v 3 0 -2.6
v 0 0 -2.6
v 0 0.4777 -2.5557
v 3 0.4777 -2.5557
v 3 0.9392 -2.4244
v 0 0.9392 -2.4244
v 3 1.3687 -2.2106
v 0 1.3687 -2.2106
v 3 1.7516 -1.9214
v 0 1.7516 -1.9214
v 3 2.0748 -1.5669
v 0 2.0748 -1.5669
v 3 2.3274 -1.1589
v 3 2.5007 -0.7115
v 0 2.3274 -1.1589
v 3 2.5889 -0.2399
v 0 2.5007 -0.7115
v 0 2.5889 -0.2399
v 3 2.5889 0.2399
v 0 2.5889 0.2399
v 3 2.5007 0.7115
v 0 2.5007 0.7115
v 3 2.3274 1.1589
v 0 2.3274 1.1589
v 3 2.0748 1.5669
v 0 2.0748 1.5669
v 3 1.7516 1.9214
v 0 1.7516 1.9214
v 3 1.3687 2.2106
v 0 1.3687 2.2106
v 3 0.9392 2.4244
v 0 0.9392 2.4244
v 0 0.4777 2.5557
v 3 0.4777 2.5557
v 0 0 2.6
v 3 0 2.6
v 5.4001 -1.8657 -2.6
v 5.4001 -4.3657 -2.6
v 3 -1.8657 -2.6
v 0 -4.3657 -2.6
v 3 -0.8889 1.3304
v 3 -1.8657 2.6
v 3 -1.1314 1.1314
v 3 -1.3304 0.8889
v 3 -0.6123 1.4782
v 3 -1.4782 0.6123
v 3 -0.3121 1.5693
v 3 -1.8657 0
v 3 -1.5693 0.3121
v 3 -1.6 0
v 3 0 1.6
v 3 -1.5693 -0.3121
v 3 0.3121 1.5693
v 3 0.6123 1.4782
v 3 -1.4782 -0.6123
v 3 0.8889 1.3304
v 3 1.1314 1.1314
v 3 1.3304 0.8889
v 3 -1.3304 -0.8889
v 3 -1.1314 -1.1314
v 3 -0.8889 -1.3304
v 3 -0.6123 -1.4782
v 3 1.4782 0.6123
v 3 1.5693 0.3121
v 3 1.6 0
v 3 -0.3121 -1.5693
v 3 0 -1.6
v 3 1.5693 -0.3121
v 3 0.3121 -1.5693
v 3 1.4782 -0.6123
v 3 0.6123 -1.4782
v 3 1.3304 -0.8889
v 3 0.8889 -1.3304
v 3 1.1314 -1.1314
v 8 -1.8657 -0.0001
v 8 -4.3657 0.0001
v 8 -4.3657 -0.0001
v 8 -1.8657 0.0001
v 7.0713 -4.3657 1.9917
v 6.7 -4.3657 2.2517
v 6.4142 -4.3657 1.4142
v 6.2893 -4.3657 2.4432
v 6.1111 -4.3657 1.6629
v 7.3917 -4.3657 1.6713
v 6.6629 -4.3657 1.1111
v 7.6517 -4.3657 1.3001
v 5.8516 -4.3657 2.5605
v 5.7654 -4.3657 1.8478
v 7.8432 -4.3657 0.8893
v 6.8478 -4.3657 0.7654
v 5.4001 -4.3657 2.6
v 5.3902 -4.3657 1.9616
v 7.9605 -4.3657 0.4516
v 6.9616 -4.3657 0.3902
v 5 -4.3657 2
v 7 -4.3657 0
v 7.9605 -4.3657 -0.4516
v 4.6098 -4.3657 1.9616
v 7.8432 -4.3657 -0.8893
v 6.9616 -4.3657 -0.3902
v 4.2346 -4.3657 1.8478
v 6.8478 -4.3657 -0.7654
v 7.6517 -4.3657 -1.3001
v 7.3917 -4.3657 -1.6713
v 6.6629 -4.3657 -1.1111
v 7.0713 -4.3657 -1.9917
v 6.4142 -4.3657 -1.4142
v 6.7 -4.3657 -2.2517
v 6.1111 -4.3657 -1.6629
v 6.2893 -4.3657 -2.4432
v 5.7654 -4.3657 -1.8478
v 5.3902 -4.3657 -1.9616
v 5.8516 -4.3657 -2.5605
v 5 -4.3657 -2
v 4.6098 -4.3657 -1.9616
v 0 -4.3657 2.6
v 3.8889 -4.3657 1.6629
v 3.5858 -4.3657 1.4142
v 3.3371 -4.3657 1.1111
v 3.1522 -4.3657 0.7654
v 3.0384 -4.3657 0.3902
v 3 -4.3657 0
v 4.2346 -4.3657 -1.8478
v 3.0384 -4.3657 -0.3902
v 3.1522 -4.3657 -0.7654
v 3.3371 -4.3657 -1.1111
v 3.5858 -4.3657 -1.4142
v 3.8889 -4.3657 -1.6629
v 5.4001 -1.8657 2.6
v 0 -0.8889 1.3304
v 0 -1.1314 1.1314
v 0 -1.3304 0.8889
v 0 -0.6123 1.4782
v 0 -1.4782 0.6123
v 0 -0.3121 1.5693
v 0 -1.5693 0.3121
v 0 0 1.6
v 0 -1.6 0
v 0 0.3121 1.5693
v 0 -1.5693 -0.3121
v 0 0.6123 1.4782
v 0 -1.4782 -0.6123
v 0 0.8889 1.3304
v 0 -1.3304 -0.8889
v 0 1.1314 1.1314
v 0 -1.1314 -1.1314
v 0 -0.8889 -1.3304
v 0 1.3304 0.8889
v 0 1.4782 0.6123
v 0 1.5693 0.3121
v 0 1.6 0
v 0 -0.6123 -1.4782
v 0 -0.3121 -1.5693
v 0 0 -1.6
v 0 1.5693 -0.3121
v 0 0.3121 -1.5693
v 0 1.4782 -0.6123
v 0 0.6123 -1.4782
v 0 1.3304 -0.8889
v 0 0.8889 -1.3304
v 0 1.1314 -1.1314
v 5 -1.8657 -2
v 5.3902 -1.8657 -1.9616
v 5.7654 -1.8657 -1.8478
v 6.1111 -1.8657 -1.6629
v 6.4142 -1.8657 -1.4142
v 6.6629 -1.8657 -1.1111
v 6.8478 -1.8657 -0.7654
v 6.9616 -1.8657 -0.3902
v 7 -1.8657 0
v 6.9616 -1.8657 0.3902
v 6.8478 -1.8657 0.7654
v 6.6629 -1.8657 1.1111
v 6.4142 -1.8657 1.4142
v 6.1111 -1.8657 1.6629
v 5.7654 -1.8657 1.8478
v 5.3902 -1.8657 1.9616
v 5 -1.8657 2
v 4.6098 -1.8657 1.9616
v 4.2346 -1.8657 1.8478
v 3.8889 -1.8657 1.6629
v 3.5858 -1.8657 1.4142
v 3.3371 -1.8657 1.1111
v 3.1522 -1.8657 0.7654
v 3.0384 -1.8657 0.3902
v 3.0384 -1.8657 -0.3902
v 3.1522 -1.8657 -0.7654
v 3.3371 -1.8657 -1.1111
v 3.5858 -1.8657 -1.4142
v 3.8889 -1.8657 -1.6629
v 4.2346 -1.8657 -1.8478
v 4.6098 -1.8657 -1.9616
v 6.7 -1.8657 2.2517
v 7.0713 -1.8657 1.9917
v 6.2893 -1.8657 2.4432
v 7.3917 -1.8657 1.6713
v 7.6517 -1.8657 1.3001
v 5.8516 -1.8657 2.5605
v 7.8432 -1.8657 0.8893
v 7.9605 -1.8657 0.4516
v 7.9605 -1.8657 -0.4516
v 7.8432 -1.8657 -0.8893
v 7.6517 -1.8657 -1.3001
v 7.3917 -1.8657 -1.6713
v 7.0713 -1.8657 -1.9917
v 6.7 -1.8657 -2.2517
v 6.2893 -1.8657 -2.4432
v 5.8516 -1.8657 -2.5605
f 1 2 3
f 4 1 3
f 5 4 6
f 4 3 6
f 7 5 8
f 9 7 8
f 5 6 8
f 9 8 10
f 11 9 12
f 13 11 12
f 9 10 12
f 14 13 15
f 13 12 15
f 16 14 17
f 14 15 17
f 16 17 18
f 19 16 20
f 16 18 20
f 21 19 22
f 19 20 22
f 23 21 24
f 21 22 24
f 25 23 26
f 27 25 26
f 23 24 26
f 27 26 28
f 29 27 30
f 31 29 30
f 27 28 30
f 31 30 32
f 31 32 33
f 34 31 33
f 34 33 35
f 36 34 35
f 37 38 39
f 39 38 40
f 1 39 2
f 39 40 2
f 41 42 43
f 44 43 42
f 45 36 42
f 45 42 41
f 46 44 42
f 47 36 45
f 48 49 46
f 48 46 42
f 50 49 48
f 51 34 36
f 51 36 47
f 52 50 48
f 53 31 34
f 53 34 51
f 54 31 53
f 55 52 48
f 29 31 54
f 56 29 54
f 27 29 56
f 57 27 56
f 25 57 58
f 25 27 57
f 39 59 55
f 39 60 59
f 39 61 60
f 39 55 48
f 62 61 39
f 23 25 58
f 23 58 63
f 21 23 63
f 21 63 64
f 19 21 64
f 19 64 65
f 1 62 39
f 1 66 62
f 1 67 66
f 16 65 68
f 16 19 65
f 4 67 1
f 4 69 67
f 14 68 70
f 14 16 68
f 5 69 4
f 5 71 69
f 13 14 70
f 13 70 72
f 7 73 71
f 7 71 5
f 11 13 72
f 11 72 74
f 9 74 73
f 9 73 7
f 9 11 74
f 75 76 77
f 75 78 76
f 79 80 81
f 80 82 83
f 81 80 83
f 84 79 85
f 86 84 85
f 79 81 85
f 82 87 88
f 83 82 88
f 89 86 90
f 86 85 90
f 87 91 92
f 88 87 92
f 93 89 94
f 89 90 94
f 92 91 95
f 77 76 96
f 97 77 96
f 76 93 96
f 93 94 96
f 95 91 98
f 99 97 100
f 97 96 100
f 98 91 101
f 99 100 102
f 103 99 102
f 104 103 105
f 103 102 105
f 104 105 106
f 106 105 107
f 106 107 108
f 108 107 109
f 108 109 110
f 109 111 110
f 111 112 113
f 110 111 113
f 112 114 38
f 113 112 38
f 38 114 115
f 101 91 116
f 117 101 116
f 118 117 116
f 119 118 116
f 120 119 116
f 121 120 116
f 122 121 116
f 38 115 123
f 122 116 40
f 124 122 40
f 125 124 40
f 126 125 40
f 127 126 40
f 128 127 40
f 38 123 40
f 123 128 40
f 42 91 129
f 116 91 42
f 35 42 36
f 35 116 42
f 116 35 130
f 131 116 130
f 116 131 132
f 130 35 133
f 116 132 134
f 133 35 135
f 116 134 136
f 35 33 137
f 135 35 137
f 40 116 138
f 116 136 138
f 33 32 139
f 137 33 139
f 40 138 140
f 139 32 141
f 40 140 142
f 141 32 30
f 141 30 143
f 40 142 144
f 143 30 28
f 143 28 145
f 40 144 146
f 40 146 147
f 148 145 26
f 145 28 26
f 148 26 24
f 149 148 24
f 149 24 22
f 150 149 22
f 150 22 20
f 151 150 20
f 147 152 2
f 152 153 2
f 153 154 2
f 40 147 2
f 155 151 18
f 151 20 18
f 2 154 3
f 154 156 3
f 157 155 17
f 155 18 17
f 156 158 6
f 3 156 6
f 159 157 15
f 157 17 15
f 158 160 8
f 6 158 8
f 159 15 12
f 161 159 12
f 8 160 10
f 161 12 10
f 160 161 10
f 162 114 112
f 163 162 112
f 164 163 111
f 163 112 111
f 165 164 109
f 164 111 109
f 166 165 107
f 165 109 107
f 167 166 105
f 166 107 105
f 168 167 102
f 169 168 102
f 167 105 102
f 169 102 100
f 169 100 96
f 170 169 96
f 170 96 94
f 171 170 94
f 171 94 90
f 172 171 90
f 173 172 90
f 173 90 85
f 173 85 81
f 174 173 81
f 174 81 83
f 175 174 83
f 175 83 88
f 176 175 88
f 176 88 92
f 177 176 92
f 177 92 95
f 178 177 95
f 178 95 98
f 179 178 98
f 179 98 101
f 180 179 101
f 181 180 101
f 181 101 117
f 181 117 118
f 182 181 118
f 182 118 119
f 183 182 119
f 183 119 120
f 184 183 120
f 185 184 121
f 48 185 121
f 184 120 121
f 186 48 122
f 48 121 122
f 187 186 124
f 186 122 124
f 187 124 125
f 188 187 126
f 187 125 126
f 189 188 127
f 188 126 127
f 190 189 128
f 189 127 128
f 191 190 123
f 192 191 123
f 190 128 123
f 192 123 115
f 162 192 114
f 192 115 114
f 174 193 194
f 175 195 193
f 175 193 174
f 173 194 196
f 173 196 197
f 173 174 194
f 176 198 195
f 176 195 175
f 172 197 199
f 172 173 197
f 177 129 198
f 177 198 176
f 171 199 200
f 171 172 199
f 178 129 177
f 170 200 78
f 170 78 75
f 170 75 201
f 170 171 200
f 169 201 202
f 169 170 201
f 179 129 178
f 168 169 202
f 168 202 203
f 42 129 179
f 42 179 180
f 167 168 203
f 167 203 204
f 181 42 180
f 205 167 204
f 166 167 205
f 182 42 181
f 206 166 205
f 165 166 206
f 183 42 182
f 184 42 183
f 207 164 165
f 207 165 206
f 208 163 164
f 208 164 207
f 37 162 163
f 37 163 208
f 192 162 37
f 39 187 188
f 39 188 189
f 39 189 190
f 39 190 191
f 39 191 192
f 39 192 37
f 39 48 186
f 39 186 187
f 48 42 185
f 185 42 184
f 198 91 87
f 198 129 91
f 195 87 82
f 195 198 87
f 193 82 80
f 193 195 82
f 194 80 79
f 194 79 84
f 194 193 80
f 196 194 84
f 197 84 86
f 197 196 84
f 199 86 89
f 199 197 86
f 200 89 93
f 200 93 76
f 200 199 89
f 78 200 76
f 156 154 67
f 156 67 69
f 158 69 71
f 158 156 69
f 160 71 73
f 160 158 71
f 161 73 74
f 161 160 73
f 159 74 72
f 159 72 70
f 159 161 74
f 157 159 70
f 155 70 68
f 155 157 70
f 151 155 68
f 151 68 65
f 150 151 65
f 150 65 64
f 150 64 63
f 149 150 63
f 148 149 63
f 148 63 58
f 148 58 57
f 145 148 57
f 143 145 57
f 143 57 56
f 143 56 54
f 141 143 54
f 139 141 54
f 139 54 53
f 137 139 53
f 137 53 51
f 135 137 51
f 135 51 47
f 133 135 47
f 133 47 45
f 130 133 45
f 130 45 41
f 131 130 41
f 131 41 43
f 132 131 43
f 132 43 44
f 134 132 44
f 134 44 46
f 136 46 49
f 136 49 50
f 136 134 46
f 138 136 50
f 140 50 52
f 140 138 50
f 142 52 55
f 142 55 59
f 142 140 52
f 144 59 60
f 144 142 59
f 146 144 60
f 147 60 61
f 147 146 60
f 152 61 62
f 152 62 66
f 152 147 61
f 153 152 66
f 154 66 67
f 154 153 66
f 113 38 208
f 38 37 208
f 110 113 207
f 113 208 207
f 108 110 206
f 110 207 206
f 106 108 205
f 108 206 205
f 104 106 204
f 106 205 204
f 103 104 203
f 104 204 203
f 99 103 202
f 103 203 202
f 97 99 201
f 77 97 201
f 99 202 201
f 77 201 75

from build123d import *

# Parameters (mm, degrees)
SKETCH1_R           = 1.6
BOSS_EXTRUDE1_DEPTH = 3
SKETCH2_W           = 5.2
SKETCH2_H           = 2.5
BOSS_EXTRUDE2_DEPTH = 5
FILLET1_R           = 2.6
SKETCH3_R           = 2
CUT_EXTRUDE1_DEPTH  = 5


with BuildPart() as part:
    # Sketch1 → Boss-Extrude1 (new body)
    with BuildSketch(Plane(origin=(0, 0, 0), x_dir=(0, 0, -1), z_dir=(1, 0, 0))):
        with BuildLine():
            ThreePointArc((2.6, 0), (0, 2.6), (-2.6, 0))
            Line((-2.6, 0), (-2.6, -4.365701483))
            Line((-2.6, -4.365701483), (2.6, -4.365701483))
            Line((2.6, -4.365701483), (2.6, 0))
        make_face()
        Circle(SKETCH1_R, mode=Mode.SUBTRACT)
    extrude(amount=BOSS_EXTRUDE1_DEPTH)

    # Sketch2 → Boss-Extrude2 (add)
    with BuildSketch(Plane(origin=(3, 0, 0), x_dir=(0, 0, -1), z_dir=(1, 0, 0))):
        with Locations((0, -3.115701483)):
            Rectangle(SKETCH2_W, SKETCH2_H)
    extrude(amount=BOSS_EXTRUDE2_DEPTH)

    # Fillet1
    fillet1_edges = [part.edges().sort_by_distance(p)[0] for p in [
        (8, -3.115701483, -2.6),
        (8, -3.115701483, 2.6),
    ]]
    fillet(fillet1_edges, radius=FILLET1_R - 0.0001)  # a hair under: the kernel refuses the full size

    # Sketch3 → Cut-Extrude1 (cut)
    with BuildSketch(Plane.XZ.offset(4.365701483)):
        with Locations(Location((5, 0, 0), (0, 0, 270))):
            Circle(SKETCH3_R)
    extrude(amount=-CUT_EXTRUDE1_DEPTH, mode=Mode.SUBTRACT)


solid = part.part
